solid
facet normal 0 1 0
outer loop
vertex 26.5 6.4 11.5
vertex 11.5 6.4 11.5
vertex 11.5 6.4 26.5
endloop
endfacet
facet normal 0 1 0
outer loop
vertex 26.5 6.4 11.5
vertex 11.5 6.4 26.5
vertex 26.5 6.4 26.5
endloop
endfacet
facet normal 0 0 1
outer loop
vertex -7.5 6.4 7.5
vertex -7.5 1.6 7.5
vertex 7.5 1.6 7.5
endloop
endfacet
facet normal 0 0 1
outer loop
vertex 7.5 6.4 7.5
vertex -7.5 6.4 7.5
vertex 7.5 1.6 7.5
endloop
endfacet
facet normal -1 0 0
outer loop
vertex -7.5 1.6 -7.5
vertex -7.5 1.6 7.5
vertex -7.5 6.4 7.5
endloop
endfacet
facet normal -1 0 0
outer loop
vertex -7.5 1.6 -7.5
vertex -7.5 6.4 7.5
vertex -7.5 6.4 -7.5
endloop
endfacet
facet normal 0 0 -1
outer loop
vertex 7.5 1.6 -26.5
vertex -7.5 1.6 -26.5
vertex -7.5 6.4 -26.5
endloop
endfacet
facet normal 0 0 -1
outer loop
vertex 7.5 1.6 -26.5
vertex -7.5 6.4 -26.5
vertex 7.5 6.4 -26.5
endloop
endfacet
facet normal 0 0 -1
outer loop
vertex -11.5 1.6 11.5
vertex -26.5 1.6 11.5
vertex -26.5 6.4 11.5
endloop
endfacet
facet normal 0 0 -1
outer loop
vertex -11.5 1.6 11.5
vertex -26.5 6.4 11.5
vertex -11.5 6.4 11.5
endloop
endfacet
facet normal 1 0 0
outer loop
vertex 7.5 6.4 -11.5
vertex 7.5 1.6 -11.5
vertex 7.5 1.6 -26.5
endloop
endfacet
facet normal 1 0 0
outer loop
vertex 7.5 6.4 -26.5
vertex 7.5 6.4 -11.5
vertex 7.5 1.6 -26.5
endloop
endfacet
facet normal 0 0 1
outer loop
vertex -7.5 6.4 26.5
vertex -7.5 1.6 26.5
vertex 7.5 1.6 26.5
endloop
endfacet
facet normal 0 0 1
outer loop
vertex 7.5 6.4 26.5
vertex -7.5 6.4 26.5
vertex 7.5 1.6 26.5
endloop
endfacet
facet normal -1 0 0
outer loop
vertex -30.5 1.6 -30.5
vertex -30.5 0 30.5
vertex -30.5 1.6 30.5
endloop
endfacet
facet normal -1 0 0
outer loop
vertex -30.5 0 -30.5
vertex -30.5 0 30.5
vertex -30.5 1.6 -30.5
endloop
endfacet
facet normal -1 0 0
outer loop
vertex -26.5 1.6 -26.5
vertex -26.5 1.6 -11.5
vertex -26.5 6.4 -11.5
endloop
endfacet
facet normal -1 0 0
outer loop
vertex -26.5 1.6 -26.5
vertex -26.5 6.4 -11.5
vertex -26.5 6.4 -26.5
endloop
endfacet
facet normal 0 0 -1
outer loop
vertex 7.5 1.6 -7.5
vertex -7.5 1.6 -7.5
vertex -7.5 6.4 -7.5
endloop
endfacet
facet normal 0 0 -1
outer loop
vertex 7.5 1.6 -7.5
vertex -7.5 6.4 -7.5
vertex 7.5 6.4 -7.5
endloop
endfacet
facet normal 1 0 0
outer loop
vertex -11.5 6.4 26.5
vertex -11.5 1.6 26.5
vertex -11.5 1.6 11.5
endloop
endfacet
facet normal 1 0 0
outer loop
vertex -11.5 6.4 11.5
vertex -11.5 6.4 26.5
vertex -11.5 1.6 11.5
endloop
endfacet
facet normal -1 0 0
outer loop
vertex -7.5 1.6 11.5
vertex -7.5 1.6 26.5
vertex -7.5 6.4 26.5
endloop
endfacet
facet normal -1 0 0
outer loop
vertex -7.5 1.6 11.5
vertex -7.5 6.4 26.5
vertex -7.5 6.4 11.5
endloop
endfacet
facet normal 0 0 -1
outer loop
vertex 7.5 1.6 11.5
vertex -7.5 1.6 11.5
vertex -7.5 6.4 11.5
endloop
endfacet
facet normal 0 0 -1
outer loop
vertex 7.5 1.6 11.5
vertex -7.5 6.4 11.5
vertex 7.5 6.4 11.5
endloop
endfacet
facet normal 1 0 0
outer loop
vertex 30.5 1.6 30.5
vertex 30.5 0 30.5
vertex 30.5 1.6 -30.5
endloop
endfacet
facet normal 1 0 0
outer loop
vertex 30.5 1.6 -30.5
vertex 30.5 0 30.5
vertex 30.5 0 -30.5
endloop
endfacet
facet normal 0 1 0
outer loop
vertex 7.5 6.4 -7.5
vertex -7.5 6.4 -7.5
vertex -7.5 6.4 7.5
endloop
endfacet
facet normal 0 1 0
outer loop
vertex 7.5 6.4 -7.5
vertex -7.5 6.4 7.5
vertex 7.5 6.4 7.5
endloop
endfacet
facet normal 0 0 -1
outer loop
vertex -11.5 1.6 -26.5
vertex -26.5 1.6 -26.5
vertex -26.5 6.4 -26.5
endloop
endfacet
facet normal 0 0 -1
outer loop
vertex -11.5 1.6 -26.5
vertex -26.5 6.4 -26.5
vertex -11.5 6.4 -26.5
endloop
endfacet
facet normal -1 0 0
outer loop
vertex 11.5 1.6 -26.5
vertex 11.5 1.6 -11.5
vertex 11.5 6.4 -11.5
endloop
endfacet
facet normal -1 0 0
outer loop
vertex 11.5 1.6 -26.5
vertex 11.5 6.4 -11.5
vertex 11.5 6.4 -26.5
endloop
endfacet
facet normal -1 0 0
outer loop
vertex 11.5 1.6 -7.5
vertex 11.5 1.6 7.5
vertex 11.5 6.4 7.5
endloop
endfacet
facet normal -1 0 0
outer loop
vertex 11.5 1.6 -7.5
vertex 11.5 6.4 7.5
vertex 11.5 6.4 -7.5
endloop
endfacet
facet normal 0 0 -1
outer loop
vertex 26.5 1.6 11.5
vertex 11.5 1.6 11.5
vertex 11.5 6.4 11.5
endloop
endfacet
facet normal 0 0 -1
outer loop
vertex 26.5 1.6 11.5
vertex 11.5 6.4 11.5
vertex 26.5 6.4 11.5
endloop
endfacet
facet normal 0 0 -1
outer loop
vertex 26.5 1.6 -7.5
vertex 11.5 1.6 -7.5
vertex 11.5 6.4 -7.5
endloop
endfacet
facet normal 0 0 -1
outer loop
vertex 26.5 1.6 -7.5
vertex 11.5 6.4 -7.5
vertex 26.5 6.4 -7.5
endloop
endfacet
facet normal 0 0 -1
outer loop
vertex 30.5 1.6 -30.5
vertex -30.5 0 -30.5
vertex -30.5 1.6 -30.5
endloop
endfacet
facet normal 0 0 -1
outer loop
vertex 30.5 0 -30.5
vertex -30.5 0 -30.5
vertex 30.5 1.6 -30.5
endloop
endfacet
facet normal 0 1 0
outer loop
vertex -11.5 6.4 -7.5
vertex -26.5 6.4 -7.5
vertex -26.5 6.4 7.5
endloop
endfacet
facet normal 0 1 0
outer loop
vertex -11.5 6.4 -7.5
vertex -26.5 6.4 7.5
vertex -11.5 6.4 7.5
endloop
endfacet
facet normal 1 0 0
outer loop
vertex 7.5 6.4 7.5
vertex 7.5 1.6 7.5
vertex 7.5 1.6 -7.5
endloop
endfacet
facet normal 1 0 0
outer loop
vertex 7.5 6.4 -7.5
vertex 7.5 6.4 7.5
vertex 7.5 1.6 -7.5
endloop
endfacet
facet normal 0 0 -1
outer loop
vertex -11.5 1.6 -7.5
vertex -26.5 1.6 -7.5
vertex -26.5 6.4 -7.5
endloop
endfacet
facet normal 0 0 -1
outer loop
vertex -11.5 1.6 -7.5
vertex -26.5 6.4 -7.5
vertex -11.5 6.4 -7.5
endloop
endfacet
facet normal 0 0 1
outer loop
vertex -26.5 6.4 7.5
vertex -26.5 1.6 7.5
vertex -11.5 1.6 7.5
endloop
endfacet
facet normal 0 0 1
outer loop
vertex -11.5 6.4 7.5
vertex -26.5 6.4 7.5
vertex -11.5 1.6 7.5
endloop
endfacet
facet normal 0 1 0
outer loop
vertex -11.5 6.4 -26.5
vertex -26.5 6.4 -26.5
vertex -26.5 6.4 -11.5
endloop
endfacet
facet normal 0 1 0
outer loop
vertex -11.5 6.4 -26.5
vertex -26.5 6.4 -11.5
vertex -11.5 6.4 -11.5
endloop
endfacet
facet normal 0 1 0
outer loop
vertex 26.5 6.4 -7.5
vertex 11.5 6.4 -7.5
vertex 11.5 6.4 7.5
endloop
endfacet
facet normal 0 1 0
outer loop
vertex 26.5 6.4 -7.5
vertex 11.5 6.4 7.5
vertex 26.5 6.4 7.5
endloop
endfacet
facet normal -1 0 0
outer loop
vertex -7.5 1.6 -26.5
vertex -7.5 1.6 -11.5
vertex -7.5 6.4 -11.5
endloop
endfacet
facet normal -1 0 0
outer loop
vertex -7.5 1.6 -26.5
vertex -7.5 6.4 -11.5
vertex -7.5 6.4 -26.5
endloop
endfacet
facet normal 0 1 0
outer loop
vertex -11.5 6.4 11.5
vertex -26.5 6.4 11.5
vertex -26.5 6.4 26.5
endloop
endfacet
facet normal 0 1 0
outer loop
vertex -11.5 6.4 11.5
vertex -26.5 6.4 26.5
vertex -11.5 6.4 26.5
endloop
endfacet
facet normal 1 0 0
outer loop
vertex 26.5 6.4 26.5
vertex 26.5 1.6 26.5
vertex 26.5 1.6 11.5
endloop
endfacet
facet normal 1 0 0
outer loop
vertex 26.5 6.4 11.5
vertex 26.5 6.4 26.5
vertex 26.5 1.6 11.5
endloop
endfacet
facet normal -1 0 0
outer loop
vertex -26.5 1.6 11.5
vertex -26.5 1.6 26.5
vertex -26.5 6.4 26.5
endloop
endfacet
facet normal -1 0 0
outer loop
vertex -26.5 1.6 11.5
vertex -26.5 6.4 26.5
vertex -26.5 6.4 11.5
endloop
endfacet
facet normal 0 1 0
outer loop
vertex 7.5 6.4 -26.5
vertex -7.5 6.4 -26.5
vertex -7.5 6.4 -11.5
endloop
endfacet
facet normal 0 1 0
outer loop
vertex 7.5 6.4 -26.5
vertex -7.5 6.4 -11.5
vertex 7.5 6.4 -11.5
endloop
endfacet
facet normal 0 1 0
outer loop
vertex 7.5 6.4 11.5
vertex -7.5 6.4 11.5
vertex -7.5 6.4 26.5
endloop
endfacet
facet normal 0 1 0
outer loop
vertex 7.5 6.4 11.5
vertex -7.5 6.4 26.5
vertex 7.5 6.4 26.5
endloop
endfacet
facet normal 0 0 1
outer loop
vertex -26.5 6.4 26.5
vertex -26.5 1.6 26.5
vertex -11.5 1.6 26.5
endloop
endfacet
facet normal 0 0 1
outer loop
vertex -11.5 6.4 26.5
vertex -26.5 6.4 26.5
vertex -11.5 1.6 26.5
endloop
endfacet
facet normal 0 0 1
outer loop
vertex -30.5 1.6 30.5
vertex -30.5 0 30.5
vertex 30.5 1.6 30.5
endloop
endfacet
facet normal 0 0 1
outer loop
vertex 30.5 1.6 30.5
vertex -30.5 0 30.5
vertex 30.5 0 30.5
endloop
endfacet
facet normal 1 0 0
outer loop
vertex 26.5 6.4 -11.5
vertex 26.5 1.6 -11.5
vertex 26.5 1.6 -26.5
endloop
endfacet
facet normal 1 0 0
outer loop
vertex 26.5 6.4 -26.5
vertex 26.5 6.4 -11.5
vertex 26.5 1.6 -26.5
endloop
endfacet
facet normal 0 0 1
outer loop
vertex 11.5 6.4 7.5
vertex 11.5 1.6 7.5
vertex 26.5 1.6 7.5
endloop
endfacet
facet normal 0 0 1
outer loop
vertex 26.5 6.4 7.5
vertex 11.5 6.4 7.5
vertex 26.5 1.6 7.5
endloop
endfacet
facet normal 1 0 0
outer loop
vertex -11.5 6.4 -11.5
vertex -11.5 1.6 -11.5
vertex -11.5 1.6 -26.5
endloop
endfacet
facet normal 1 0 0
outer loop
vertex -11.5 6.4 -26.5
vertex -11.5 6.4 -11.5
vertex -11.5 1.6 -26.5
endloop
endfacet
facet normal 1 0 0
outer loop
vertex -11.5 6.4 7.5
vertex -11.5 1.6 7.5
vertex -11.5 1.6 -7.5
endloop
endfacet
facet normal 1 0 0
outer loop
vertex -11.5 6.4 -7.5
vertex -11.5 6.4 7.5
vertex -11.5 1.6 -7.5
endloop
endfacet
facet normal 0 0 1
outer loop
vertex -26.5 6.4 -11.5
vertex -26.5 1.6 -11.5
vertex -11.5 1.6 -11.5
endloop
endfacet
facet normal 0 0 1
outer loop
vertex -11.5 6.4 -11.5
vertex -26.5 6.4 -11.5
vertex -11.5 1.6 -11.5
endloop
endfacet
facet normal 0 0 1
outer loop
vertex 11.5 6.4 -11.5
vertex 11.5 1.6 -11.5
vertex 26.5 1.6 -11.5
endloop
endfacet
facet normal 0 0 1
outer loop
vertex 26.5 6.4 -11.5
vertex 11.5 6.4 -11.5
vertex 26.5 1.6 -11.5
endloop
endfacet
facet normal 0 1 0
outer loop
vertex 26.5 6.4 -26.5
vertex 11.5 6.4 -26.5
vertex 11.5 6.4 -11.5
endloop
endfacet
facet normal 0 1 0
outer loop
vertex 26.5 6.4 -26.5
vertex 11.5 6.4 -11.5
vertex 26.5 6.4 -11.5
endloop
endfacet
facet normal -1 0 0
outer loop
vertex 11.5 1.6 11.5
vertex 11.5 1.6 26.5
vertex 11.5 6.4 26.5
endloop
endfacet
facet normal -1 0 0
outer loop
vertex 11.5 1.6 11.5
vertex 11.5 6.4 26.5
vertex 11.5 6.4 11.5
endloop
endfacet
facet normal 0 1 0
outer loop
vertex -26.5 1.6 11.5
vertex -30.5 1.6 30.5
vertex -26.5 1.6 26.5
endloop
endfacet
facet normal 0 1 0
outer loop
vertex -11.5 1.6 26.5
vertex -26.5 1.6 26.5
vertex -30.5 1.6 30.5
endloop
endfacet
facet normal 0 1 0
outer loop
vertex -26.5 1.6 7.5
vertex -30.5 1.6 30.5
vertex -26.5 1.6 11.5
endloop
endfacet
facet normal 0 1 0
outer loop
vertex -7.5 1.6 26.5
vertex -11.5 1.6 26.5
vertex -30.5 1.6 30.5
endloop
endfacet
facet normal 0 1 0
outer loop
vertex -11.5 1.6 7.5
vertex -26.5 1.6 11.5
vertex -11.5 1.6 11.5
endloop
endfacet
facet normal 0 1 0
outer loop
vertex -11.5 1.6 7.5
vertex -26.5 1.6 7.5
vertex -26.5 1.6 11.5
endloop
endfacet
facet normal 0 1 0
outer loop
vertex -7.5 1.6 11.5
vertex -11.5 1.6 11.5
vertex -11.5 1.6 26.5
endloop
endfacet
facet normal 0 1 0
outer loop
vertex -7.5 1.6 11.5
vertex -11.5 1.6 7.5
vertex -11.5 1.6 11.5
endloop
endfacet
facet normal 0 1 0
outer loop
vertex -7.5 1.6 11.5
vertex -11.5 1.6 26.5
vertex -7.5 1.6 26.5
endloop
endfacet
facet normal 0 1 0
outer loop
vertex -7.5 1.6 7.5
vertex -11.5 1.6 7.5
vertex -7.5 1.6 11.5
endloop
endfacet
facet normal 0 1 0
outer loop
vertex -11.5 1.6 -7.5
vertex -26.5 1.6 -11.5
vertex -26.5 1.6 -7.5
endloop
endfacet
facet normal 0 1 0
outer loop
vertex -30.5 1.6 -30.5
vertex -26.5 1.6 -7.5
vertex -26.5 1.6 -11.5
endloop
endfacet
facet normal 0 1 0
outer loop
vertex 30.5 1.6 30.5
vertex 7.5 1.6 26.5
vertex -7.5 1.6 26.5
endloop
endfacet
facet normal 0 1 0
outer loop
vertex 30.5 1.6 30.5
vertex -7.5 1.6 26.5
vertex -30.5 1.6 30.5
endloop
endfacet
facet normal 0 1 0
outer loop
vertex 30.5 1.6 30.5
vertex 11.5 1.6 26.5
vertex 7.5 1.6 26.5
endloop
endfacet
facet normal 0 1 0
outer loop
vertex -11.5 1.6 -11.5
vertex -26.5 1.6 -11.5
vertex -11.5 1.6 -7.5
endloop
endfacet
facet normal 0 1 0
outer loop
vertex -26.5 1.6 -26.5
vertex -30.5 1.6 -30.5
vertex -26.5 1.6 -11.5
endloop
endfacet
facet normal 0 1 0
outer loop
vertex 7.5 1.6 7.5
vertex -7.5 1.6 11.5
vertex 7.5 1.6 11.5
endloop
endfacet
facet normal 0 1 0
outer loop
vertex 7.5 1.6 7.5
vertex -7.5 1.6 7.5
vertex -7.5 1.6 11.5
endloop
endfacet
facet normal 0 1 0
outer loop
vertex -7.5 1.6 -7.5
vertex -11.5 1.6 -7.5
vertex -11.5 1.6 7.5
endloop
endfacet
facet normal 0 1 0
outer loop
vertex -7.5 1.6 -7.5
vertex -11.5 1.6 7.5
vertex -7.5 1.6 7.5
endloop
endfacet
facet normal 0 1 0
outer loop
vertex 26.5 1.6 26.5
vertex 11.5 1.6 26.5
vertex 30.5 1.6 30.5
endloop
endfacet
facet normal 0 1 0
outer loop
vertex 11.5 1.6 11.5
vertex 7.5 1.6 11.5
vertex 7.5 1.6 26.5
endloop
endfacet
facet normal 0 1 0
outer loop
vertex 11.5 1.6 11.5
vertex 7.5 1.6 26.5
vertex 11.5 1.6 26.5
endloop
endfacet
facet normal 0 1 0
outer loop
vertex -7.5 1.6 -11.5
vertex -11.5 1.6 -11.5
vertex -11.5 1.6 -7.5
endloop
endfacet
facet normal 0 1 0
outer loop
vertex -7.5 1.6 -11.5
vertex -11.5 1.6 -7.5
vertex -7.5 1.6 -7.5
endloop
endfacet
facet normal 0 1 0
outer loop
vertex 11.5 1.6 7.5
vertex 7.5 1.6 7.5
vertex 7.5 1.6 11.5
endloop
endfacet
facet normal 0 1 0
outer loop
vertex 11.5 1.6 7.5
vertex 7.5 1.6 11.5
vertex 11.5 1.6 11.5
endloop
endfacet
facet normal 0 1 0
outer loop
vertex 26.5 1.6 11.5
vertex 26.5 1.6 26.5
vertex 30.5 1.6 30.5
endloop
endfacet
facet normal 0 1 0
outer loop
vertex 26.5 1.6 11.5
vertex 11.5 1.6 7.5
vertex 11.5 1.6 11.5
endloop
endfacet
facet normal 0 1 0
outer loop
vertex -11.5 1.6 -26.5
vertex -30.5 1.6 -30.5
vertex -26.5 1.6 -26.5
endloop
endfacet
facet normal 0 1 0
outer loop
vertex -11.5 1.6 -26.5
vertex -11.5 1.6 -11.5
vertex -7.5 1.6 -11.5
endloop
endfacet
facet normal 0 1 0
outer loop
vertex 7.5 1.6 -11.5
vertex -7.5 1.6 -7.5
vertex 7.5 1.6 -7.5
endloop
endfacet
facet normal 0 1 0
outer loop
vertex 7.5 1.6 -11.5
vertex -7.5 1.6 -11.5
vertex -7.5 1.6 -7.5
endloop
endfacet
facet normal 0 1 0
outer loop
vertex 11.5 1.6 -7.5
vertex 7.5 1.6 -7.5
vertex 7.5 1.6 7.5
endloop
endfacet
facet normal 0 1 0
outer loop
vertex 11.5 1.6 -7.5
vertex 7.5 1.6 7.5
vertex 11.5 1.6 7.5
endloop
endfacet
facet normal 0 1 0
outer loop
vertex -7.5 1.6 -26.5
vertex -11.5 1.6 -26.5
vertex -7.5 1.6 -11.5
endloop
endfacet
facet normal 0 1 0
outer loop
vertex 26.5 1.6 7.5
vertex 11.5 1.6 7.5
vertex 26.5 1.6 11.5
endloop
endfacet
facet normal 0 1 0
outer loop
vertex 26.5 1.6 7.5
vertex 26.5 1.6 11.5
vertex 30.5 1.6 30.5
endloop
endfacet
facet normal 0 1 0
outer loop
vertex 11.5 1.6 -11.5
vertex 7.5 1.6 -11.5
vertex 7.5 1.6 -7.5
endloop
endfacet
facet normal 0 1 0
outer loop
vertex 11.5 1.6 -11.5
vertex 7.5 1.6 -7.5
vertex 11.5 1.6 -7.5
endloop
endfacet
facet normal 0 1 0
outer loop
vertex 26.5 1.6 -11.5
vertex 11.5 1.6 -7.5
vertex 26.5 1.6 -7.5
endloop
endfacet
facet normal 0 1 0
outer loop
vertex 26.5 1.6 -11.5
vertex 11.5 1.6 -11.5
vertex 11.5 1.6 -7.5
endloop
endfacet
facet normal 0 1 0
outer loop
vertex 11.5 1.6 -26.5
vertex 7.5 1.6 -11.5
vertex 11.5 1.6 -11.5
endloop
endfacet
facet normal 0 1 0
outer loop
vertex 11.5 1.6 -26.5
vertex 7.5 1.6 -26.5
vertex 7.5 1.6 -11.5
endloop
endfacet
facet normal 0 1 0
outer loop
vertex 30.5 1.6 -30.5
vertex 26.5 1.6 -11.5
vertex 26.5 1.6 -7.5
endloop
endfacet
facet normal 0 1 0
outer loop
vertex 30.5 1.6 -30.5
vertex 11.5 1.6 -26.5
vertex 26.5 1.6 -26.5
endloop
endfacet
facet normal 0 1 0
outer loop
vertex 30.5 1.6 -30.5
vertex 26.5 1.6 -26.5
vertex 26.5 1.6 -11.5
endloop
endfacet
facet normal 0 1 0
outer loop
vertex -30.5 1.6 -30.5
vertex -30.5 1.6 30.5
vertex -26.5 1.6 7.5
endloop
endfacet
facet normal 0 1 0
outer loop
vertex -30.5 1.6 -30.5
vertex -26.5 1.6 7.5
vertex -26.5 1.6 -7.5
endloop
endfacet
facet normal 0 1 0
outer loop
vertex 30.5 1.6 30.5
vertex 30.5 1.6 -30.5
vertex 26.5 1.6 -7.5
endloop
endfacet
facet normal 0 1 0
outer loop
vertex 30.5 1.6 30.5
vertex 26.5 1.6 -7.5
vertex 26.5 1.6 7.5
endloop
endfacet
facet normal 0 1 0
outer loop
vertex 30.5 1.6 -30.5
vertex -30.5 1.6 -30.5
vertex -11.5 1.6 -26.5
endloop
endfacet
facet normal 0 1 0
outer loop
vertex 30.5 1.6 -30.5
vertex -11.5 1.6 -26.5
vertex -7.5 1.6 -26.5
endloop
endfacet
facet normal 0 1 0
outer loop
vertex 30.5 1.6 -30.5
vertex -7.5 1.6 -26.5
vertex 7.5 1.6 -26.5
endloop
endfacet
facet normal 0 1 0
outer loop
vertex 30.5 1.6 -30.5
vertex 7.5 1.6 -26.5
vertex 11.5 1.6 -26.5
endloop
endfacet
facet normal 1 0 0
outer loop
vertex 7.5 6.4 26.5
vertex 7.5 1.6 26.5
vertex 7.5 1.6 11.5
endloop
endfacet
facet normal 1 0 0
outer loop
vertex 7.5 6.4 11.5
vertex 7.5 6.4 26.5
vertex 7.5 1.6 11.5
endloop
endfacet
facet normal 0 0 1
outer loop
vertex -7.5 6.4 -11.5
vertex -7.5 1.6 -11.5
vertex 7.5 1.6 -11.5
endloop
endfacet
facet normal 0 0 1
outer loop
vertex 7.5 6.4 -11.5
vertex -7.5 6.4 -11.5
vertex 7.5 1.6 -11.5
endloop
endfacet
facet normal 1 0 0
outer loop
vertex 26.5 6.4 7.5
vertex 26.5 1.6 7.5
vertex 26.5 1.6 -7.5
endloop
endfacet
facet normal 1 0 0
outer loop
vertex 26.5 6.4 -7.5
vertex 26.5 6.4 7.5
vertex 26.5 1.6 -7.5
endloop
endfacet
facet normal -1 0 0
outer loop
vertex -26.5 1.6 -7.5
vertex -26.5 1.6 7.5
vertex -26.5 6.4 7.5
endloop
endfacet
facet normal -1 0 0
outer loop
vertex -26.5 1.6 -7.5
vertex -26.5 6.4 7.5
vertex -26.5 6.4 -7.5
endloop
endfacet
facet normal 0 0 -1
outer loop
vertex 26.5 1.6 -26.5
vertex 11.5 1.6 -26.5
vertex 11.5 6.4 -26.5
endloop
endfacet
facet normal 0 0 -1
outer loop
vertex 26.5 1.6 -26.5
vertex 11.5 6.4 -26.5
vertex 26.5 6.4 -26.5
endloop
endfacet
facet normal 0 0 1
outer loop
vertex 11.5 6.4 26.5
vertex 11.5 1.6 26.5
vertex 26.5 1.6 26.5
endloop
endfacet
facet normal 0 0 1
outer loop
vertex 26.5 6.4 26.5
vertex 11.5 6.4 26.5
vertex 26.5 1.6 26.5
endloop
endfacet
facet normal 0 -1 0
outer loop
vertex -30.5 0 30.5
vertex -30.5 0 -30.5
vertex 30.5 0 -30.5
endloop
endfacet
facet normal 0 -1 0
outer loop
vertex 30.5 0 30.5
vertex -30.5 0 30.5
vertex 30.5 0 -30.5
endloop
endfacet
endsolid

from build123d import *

# Parameters (mm, degrees)
SKETCH1_W           = 61
SKETCH1_H           = 61
BOSS_EXTRUDE1_DEPTH = 1.6
SKETCH2_W           = 15
SKETCH2_H           = 15
BOSS_EXTRUDE2_DEPTH = 4.8


with BuildPart() as part:
    # Sketch1 → Boss-Extrude1 (new body)
    with BuildSketch(Plane(origin=(0, 0, 0), x_dir=(1, 0, 0), z_dir=(0, 1, 0))):
        Rectangle(SKETCH1_W, SKETCH1_H)
    extrude(amount=BOSS_EXTRUDE1_DEPTH)

    # Sketch2 → Boss-Extrude2 (add)
    with BuildSketch(Plane(origin=(0, 1.6, 0), x_dir=(1, 0, 0), z_dir=(0, 1, 0))):
        with Locations((-19, 19)):
            Rectangle(SKETCH2_W, SKETCH2_H)
        with Locations((0, 19)):
            Rectangle(SKETCH2_W, SKETCH2_H)
        with Locations((19, 19)):
            Rectangle(SKETCH2_W, SKETCH2_H)
        with Locations((19, 0)):
            Rectangle(SKETCH2_W, SKETCH2_H)
        Rectangle(SKETCH2_W, SKETCH2_H)
        with Locations((-19, 0)):
            Rectangle(SKETCH2_W, SKETCH2_H)
        with Locations((-19, -19)):
            Rectangle(SKETCH2_W, SKETCH2_H)
        with Locations((0, -19)):
            Rectangle(SKETCH2_W, SKETCH2_H)
        with Locations((19, -19)):
            Rectangle(SKETCH2_W, SKETCH2_H)
    extrude(amount=BOSS_EXTRUDE2_DEPTH)


solid = part.part
